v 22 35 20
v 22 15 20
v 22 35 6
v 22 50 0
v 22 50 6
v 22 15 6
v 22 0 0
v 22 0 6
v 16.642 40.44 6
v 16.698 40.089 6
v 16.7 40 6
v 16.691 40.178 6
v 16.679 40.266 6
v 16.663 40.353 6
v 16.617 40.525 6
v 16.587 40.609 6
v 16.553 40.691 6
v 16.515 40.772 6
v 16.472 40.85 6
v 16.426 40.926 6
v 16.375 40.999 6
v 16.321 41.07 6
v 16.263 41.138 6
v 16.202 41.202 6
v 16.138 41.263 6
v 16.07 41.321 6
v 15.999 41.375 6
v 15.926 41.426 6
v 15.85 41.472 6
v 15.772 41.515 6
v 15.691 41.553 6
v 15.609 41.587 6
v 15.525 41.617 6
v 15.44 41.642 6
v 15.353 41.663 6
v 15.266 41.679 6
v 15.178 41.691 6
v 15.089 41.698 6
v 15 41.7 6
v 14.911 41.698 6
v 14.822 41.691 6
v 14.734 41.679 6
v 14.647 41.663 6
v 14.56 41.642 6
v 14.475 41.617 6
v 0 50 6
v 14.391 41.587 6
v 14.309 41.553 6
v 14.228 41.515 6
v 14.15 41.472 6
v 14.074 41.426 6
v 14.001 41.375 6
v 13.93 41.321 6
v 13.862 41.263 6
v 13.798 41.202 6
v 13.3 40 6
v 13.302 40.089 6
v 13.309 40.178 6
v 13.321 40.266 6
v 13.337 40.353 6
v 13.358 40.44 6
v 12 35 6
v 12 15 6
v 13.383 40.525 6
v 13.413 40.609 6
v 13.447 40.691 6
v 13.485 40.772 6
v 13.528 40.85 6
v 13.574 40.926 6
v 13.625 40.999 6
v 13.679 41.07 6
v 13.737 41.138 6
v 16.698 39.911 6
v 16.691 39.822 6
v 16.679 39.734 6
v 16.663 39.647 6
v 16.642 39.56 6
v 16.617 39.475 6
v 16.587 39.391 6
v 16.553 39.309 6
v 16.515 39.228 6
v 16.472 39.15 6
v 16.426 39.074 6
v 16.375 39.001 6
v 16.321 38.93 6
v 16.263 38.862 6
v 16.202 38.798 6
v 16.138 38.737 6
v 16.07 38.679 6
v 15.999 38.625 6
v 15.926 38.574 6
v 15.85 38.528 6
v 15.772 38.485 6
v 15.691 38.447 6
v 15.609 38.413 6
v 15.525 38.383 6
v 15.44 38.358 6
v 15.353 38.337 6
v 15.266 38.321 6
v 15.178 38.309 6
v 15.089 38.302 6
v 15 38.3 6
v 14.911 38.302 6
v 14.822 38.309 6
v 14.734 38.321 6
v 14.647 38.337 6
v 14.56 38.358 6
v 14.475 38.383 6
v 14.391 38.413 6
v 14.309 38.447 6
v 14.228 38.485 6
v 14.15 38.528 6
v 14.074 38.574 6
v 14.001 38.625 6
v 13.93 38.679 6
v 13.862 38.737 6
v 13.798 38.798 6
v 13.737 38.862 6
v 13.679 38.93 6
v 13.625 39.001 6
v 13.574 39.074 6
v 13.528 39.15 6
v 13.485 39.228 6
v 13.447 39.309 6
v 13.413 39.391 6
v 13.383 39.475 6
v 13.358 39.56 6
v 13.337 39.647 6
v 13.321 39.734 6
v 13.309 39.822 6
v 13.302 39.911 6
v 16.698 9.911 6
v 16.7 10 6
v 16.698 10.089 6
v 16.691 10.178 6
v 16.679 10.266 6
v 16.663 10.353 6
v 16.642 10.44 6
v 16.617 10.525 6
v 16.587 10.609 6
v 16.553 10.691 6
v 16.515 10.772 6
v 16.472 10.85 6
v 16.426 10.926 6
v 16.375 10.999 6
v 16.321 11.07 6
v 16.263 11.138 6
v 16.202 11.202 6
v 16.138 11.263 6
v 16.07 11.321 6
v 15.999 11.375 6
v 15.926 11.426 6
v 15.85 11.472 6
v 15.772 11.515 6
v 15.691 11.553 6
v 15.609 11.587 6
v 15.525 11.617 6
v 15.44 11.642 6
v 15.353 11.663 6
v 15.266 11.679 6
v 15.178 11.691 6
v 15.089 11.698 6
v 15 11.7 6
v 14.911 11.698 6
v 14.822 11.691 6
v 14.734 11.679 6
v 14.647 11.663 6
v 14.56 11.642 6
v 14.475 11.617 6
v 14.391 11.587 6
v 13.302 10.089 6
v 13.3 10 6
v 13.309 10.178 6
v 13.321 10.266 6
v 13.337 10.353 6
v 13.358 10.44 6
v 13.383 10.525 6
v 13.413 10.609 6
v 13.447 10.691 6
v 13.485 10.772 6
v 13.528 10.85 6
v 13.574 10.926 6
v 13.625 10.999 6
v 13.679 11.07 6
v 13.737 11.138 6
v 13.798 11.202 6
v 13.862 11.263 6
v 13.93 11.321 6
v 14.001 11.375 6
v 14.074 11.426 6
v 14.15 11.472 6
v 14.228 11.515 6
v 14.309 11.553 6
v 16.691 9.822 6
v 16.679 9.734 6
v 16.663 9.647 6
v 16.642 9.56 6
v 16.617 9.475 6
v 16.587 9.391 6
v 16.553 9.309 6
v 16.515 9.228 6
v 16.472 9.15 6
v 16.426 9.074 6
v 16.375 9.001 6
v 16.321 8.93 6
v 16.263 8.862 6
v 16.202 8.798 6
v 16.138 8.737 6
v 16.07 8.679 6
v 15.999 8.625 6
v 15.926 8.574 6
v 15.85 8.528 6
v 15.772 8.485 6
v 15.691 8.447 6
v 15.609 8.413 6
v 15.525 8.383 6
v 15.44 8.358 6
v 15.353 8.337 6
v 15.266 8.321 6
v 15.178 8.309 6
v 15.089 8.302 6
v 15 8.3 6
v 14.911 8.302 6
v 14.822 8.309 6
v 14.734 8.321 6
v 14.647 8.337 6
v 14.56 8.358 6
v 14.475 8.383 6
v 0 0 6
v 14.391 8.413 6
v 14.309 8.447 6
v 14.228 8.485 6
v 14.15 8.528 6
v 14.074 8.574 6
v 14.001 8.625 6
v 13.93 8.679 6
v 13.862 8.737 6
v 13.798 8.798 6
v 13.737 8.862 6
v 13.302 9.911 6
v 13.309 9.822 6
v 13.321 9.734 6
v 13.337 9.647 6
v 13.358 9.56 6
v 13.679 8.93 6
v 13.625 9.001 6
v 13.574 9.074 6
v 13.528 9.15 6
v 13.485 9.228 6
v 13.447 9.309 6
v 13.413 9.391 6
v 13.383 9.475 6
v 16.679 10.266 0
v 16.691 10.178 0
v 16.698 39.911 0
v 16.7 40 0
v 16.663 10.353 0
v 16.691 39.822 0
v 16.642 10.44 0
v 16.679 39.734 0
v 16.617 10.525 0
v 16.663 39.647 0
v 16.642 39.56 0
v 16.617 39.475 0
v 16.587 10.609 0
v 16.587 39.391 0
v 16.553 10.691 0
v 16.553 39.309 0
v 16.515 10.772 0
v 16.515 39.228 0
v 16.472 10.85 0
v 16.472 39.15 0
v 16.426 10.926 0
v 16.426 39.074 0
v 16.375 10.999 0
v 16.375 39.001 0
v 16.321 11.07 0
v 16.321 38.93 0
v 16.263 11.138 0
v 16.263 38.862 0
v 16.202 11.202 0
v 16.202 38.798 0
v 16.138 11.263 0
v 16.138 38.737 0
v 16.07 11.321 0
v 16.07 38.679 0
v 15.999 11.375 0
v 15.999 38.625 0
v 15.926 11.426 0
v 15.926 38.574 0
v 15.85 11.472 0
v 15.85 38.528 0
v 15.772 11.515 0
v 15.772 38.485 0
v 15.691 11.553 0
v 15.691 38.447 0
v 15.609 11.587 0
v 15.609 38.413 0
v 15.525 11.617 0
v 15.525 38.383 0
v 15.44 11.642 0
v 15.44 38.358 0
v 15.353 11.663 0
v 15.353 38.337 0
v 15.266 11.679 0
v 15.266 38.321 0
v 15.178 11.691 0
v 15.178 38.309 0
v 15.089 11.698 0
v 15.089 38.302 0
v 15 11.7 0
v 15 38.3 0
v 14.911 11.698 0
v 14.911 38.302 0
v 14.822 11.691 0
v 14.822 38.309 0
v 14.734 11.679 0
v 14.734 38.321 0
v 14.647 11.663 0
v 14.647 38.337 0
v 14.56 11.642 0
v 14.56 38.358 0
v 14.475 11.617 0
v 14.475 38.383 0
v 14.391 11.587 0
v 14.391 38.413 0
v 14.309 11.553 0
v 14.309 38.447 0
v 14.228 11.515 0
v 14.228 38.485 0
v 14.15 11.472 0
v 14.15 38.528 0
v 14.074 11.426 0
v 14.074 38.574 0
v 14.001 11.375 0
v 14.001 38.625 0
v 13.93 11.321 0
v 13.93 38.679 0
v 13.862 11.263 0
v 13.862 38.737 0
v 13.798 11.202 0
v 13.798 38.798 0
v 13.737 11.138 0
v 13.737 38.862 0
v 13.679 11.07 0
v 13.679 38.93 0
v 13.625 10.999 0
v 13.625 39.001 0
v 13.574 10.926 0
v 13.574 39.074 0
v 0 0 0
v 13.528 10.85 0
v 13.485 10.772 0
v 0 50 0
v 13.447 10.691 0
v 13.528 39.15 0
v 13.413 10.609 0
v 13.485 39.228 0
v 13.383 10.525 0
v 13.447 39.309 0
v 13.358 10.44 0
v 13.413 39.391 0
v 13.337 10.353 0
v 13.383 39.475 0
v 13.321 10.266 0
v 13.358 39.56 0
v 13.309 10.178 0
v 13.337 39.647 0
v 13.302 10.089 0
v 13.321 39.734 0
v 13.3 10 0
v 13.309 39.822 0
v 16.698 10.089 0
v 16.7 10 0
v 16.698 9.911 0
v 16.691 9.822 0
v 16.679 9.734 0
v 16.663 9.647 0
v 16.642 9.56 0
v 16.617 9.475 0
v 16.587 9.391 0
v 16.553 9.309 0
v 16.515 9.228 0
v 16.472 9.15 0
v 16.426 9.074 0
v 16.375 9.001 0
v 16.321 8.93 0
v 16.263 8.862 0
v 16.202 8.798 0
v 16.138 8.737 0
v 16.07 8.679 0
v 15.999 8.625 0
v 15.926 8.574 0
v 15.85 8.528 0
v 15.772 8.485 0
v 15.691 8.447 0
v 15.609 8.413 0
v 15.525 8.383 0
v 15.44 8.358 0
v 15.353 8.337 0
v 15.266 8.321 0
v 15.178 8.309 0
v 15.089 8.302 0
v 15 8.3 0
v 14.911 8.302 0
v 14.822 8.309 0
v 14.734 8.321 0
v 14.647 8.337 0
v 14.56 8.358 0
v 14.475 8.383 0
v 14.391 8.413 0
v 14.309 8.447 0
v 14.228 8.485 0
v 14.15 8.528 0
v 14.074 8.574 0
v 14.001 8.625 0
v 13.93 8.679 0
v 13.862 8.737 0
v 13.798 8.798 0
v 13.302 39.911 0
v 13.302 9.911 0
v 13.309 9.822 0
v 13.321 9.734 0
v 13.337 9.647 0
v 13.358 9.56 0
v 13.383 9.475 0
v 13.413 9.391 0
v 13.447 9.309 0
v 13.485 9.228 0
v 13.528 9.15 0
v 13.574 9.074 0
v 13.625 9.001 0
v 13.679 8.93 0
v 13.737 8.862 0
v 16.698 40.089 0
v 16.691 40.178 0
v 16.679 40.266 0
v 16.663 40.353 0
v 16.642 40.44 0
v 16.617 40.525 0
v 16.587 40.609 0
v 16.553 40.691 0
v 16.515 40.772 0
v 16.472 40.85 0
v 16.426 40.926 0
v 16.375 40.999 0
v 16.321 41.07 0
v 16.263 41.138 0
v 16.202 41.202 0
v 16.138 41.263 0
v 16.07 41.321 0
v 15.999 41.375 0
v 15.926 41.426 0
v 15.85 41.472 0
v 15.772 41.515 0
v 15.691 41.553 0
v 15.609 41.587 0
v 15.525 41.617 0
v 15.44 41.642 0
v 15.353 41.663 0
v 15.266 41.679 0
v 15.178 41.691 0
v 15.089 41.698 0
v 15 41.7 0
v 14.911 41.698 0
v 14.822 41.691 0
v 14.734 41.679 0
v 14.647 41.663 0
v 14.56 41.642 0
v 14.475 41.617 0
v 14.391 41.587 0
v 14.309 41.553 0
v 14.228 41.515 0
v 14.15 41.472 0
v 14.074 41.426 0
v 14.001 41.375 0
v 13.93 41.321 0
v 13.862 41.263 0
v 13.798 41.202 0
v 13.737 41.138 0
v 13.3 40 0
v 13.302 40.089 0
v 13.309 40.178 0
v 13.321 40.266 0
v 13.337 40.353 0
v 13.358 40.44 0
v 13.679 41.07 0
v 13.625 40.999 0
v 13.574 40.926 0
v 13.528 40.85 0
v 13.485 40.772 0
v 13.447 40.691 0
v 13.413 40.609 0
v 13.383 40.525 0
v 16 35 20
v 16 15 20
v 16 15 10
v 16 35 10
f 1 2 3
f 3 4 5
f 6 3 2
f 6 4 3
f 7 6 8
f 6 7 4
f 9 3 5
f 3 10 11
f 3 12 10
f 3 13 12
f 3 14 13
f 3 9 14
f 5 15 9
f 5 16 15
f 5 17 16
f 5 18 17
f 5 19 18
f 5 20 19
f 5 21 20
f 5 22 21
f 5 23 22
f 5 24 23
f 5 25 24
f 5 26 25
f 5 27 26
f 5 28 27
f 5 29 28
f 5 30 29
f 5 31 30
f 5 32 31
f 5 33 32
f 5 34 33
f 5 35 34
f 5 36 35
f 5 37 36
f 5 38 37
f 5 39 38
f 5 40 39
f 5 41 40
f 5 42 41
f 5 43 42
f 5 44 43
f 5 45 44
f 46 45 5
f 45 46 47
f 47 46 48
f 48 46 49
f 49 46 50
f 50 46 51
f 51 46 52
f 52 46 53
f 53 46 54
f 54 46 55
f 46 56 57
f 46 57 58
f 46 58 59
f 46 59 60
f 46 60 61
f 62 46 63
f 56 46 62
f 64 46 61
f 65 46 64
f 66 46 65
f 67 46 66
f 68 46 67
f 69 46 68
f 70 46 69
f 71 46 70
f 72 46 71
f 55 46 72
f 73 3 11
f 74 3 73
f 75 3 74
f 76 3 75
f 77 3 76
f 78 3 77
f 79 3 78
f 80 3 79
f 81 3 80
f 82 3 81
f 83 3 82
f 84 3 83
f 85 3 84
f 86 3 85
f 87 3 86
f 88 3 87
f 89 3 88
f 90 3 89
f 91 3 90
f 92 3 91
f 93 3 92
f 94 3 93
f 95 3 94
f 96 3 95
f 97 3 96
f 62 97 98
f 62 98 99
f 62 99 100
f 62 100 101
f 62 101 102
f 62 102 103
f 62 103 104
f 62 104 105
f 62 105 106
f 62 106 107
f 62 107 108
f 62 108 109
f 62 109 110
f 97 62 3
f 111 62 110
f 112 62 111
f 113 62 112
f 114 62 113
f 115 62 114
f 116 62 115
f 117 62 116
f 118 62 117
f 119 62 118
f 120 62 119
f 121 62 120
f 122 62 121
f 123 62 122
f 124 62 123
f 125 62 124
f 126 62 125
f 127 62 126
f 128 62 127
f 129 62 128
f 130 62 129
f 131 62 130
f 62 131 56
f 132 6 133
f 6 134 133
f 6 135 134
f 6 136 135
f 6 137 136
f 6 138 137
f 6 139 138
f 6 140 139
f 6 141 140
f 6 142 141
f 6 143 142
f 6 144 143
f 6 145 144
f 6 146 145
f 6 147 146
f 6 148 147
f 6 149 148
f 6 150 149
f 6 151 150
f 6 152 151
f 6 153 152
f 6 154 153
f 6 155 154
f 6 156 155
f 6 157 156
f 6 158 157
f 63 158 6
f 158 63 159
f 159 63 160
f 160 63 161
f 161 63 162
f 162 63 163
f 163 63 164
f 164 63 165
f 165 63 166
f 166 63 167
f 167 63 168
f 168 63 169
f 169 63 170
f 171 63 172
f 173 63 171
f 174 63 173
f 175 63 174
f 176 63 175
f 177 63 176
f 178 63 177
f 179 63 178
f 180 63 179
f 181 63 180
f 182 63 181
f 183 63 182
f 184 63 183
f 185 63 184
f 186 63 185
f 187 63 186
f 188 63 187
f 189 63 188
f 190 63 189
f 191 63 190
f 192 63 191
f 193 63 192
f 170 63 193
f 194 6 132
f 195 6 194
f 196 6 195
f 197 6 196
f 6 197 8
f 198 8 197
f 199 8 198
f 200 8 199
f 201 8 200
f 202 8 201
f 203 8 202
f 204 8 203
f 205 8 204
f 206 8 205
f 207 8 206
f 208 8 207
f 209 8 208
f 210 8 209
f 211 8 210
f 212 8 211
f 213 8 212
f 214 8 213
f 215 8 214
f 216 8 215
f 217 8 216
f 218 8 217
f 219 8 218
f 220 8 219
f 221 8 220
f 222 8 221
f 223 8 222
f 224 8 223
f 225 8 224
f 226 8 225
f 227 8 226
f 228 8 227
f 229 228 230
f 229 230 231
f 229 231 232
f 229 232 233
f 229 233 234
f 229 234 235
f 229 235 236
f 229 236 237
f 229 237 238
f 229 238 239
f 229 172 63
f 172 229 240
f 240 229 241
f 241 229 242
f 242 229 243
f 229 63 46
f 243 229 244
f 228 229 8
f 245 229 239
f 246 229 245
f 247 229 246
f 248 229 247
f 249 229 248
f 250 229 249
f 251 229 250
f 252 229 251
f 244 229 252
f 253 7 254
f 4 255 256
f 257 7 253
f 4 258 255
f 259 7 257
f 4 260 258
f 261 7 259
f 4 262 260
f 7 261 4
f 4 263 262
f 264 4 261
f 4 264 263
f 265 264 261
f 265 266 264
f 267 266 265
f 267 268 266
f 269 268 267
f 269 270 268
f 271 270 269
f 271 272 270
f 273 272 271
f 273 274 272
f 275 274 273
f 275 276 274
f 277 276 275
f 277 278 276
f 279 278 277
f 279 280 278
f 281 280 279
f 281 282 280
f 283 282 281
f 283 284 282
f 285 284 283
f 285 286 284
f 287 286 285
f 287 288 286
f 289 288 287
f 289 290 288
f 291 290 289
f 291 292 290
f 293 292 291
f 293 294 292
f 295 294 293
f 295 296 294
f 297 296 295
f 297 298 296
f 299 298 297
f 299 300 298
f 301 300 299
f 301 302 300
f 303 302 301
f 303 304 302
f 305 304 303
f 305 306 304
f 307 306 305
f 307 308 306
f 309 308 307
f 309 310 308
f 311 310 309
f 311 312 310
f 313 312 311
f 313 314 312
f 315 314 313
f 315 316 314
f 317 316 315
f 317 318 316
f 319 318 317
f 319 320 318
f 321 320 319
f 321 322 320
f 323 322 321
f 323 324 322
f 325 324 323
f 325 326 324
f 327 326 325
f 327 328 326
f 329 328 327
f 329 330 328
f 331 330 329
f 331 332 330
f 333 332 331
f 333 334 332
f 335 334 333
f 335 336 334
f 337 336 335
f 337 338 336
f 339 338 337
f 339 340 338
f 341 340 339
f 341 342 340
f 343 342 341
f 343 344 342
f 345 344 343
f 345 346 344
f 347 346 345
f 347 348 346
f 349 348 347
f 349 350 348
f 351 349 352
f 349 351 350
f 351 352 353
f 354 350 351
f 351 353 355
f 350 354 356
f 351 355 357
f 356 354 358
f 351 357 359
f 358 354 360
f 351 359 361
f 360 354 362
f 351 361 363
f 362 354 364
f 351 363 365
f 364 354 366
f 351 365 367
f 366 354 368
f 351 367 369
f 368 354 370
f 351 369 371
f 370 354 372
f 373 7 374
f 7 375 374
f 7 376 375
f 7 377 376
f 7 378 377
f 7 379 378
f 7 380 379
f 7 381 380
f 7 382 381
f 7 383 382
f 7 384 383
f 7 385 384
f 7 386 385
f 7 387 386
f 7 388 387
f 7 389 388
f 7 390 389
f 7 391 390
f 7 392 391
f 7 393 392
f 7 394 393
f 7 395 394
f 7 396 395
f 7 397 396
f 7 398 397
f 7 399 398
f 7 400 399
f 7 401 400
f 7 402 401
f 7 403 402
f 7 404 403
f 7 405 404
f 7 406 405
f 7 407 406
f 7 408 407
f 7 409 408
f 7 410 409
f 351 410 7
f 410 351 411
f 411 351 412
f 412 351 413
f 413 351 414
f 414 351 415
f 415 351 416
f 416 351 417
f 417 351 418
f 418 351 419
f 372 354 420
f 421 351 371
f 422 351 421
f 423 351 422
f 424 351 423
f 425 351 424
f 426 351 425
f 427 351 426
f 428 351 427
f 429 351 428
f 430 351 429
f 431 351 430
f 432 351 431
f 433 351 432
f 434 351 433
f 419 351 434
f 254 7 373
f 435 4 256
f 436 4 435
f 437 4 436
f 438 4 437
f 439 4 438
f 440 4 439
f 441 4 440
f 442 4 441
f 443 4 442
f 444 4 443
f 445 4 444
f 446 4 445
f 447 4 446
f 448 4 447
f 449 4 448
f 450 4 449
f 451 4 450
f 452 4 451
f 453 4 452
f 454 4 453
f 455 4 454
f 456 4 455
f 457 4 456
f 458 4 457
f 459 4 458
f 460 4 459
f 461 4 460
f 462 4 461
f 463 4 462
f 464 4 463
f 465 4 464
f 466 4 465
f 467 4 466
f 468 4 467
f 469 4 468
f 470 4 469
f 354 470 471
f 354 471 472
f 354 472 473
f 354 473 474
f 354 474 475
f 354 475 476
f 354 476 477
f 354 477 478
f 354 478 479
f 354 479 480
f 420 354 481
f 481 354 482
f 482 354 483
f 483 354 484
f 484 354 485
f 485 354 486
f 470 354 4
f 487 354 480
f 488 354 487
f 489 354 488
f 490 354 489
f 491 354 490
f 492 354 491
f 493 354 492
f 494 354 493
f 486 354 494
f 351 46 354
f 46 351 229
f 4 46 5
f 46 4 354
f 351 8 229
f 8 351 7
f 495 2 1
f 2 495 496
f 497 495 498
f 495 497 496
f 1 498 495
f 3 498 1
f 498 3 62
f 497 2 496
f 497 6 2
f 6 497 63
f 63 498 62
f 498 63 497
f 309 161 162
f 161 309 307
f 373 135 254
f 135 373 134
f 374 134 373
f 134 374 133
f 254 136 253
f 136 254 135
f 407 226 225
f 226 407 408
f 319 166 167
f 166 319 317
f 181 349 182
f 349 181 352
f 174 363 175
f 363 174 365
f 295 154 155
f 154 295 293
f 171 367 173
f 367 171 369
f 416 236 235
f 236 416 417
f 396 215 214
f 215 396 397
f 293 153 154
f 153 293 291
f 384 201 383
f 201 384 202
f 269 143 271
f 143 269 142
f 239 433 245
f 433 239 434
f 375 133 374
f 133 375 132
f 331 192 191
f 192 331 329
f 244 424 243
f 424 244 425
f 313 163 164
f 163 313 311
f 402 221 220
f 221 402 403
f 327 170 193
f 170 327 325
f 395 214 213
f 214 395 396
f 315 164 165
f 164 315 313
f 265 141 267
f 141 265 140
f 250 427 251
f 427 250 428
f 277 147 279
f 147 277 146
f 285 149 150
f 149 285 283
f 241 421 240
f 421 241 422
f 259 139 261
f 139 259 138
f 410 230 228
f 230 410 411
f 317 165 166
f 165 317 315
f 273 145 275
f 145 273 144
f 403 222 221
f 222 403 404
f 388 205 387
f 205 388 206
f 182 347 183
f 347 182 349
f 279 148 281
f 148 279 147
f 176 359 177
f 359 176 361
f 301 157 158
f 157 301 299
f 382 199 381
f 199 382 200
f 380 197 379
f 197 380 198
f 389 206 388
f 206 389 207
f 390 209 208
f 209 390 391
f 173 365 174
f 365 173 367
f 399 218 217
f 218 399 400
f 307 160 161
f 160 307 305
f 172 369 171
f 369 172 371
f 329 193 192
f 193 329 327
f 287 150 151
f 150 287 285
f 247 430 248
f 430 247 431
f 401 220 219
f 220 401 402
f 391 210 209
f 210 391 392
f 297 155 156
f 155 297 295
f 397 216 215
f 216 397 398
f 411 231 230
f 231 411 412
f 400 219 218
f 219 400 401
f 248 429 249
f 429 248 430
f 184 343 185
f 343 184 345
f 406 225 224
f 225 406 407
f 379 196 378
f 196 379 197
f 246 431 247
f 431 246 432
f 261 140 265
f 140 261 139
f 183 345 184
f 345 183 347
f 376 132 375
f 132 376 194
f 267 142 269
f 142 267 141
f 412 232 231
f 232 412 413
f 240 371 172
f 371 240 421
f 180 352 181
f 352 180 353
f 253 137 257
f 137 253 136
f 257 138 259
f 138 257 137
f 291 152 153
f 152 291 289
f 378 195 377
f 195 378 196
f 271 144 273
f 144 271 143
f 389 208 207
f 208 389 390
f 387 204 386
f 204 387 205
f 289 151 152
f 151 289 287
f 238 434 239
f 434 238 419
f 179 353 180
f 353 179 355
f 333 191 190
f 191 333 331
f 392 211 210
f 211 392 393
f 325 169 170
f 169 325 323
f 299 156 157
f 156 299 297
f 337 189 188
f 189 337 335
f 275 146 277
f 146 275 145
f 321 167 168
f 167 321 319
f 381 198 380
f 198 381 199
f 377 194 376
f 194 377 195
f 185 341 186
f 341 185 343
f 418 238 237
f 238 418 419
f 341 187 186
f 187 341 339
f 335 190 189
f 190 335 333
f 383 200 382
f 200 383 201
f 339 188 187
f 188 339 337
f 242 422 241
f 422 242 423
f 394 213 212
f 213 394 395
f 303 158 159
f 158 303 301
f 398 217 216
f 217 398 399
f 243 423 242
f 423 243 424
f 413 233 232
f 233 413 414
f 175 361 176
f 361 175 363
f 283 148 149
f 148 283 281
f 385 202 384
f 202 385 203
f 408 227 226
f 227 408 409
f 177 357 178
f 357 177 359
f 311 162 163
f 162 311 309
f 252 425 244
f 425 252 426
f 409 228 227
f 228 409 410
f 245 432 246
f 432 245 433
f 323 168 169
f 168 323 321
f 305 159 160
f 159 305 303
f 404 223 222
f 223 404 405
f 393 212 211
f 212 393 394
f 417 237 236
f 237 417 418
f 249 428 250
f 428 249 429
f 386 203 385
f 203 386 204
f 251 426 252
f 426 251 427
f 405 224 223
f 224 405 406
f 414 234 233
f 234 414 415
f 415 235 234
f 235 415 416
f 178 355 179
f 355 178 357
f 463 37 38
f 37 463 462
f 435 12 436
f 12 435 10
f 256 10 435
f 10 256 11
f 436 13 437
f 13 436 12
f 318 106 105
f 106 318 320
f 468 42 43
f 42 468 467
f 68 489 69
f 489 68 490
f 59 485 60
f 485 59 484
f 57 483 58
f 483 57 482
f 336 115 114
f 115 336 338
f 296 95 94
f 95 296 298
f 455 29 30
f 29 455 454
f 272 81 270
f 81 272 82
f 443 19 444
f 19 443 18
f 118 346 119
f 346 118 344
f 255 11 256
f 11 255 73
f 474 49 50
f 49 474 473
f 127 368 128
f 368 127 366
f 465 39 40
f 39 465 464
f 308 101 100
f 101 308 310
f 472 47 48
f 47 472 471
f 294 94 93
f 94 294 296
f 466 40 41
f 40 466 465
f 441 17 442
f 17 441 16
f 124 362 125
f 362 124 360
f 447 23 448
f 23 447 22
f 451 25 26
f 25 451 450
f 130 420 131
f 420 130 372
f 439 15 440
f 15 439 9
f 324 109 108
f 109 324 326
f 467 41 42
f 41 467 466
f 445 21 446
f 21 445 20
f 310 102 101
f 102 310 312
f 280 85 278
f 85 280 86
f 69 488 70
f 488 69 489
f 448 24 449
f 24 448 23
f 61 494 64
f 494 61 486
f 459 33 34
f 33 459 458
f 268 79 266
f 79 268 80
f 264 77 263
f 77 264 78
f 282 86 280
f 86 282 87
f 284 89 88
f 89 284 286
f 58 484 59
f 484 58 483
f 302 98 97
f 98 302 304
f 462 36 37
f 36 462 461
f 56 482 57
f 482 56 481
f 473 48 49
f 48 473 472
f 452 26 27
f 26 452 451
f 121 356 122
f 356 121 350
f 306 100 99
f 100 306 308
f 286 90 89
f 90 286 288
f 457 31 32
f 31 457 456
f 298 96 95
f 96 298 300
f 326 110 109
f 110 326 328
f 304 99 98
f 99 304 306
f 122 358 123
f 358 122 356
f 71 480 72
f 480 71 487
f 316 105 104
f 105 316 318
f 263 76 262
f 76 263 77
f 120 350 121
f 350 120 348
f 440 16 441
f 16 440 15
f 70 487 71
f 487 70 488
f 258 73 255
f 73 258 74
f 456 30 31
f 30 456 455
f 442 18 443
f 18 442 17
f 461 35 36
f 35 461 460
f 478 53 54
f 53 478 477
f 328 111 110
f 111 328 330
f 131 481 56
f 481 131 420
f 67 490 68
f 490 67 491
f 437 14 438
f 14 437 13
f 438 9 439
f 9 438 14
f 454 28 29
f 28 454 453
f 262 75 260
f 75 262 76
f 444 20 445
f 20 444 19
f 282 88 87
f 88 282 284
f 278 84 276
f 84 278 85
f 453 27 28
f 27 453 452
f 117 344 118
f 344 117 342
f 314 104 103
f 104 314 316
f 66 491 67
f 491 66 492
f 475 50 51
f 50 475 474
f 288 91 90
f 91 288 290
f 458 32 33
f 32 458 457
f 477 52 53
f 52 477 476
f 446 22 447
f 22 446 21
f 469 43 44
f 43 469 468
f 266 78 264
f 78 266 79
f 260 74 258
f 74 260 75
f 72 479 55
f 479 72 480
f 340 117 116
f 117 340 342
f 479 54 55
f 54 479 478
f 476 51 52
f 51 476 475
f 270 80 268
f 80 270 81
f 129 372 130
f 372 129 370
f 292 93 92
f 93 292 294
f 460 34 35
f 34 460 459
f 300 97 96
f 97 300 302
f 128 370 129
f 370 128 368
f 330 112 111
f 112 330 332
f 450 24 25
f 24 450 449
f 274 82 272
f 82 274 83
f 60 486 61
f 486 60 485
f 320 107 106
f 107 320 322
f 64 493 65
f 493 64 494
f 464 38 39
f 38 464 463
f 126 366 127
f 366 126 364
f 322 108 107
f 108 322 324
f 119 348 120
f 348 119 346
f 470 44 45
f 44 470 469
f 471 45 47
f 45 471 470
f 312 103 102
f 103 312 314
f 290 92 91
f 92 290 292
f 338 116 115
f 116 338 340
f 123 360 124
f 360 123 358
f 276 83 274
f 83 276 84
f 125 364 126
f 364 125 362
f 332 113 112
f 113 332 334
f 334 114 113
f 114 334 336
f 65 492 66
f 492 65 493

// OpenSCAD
$fn=120;

difference(){
    union(){
cube([30-8,50,6]);
    
   translate([30-6-8,15]){    
    cube([6,20,20]);  
  }
  translate([12,15,6]){
  rotate([0,45,0])    
    cube([6,20,6]);  
  }
  }
  
  
union(){
//  translate([30-8,0]){    
//    cube([8,30,30]);  
//  }
//  
//    translate([30-8,0]){    
//    #cube([30,30,6]);  
//  }
//  
  translate([15,10]){    
      cylinder(d=3.4, h=100);
   }
  
    translate([15,50-10]){    
      cylinder(d=3.4, h=100);
   }
  }
}
